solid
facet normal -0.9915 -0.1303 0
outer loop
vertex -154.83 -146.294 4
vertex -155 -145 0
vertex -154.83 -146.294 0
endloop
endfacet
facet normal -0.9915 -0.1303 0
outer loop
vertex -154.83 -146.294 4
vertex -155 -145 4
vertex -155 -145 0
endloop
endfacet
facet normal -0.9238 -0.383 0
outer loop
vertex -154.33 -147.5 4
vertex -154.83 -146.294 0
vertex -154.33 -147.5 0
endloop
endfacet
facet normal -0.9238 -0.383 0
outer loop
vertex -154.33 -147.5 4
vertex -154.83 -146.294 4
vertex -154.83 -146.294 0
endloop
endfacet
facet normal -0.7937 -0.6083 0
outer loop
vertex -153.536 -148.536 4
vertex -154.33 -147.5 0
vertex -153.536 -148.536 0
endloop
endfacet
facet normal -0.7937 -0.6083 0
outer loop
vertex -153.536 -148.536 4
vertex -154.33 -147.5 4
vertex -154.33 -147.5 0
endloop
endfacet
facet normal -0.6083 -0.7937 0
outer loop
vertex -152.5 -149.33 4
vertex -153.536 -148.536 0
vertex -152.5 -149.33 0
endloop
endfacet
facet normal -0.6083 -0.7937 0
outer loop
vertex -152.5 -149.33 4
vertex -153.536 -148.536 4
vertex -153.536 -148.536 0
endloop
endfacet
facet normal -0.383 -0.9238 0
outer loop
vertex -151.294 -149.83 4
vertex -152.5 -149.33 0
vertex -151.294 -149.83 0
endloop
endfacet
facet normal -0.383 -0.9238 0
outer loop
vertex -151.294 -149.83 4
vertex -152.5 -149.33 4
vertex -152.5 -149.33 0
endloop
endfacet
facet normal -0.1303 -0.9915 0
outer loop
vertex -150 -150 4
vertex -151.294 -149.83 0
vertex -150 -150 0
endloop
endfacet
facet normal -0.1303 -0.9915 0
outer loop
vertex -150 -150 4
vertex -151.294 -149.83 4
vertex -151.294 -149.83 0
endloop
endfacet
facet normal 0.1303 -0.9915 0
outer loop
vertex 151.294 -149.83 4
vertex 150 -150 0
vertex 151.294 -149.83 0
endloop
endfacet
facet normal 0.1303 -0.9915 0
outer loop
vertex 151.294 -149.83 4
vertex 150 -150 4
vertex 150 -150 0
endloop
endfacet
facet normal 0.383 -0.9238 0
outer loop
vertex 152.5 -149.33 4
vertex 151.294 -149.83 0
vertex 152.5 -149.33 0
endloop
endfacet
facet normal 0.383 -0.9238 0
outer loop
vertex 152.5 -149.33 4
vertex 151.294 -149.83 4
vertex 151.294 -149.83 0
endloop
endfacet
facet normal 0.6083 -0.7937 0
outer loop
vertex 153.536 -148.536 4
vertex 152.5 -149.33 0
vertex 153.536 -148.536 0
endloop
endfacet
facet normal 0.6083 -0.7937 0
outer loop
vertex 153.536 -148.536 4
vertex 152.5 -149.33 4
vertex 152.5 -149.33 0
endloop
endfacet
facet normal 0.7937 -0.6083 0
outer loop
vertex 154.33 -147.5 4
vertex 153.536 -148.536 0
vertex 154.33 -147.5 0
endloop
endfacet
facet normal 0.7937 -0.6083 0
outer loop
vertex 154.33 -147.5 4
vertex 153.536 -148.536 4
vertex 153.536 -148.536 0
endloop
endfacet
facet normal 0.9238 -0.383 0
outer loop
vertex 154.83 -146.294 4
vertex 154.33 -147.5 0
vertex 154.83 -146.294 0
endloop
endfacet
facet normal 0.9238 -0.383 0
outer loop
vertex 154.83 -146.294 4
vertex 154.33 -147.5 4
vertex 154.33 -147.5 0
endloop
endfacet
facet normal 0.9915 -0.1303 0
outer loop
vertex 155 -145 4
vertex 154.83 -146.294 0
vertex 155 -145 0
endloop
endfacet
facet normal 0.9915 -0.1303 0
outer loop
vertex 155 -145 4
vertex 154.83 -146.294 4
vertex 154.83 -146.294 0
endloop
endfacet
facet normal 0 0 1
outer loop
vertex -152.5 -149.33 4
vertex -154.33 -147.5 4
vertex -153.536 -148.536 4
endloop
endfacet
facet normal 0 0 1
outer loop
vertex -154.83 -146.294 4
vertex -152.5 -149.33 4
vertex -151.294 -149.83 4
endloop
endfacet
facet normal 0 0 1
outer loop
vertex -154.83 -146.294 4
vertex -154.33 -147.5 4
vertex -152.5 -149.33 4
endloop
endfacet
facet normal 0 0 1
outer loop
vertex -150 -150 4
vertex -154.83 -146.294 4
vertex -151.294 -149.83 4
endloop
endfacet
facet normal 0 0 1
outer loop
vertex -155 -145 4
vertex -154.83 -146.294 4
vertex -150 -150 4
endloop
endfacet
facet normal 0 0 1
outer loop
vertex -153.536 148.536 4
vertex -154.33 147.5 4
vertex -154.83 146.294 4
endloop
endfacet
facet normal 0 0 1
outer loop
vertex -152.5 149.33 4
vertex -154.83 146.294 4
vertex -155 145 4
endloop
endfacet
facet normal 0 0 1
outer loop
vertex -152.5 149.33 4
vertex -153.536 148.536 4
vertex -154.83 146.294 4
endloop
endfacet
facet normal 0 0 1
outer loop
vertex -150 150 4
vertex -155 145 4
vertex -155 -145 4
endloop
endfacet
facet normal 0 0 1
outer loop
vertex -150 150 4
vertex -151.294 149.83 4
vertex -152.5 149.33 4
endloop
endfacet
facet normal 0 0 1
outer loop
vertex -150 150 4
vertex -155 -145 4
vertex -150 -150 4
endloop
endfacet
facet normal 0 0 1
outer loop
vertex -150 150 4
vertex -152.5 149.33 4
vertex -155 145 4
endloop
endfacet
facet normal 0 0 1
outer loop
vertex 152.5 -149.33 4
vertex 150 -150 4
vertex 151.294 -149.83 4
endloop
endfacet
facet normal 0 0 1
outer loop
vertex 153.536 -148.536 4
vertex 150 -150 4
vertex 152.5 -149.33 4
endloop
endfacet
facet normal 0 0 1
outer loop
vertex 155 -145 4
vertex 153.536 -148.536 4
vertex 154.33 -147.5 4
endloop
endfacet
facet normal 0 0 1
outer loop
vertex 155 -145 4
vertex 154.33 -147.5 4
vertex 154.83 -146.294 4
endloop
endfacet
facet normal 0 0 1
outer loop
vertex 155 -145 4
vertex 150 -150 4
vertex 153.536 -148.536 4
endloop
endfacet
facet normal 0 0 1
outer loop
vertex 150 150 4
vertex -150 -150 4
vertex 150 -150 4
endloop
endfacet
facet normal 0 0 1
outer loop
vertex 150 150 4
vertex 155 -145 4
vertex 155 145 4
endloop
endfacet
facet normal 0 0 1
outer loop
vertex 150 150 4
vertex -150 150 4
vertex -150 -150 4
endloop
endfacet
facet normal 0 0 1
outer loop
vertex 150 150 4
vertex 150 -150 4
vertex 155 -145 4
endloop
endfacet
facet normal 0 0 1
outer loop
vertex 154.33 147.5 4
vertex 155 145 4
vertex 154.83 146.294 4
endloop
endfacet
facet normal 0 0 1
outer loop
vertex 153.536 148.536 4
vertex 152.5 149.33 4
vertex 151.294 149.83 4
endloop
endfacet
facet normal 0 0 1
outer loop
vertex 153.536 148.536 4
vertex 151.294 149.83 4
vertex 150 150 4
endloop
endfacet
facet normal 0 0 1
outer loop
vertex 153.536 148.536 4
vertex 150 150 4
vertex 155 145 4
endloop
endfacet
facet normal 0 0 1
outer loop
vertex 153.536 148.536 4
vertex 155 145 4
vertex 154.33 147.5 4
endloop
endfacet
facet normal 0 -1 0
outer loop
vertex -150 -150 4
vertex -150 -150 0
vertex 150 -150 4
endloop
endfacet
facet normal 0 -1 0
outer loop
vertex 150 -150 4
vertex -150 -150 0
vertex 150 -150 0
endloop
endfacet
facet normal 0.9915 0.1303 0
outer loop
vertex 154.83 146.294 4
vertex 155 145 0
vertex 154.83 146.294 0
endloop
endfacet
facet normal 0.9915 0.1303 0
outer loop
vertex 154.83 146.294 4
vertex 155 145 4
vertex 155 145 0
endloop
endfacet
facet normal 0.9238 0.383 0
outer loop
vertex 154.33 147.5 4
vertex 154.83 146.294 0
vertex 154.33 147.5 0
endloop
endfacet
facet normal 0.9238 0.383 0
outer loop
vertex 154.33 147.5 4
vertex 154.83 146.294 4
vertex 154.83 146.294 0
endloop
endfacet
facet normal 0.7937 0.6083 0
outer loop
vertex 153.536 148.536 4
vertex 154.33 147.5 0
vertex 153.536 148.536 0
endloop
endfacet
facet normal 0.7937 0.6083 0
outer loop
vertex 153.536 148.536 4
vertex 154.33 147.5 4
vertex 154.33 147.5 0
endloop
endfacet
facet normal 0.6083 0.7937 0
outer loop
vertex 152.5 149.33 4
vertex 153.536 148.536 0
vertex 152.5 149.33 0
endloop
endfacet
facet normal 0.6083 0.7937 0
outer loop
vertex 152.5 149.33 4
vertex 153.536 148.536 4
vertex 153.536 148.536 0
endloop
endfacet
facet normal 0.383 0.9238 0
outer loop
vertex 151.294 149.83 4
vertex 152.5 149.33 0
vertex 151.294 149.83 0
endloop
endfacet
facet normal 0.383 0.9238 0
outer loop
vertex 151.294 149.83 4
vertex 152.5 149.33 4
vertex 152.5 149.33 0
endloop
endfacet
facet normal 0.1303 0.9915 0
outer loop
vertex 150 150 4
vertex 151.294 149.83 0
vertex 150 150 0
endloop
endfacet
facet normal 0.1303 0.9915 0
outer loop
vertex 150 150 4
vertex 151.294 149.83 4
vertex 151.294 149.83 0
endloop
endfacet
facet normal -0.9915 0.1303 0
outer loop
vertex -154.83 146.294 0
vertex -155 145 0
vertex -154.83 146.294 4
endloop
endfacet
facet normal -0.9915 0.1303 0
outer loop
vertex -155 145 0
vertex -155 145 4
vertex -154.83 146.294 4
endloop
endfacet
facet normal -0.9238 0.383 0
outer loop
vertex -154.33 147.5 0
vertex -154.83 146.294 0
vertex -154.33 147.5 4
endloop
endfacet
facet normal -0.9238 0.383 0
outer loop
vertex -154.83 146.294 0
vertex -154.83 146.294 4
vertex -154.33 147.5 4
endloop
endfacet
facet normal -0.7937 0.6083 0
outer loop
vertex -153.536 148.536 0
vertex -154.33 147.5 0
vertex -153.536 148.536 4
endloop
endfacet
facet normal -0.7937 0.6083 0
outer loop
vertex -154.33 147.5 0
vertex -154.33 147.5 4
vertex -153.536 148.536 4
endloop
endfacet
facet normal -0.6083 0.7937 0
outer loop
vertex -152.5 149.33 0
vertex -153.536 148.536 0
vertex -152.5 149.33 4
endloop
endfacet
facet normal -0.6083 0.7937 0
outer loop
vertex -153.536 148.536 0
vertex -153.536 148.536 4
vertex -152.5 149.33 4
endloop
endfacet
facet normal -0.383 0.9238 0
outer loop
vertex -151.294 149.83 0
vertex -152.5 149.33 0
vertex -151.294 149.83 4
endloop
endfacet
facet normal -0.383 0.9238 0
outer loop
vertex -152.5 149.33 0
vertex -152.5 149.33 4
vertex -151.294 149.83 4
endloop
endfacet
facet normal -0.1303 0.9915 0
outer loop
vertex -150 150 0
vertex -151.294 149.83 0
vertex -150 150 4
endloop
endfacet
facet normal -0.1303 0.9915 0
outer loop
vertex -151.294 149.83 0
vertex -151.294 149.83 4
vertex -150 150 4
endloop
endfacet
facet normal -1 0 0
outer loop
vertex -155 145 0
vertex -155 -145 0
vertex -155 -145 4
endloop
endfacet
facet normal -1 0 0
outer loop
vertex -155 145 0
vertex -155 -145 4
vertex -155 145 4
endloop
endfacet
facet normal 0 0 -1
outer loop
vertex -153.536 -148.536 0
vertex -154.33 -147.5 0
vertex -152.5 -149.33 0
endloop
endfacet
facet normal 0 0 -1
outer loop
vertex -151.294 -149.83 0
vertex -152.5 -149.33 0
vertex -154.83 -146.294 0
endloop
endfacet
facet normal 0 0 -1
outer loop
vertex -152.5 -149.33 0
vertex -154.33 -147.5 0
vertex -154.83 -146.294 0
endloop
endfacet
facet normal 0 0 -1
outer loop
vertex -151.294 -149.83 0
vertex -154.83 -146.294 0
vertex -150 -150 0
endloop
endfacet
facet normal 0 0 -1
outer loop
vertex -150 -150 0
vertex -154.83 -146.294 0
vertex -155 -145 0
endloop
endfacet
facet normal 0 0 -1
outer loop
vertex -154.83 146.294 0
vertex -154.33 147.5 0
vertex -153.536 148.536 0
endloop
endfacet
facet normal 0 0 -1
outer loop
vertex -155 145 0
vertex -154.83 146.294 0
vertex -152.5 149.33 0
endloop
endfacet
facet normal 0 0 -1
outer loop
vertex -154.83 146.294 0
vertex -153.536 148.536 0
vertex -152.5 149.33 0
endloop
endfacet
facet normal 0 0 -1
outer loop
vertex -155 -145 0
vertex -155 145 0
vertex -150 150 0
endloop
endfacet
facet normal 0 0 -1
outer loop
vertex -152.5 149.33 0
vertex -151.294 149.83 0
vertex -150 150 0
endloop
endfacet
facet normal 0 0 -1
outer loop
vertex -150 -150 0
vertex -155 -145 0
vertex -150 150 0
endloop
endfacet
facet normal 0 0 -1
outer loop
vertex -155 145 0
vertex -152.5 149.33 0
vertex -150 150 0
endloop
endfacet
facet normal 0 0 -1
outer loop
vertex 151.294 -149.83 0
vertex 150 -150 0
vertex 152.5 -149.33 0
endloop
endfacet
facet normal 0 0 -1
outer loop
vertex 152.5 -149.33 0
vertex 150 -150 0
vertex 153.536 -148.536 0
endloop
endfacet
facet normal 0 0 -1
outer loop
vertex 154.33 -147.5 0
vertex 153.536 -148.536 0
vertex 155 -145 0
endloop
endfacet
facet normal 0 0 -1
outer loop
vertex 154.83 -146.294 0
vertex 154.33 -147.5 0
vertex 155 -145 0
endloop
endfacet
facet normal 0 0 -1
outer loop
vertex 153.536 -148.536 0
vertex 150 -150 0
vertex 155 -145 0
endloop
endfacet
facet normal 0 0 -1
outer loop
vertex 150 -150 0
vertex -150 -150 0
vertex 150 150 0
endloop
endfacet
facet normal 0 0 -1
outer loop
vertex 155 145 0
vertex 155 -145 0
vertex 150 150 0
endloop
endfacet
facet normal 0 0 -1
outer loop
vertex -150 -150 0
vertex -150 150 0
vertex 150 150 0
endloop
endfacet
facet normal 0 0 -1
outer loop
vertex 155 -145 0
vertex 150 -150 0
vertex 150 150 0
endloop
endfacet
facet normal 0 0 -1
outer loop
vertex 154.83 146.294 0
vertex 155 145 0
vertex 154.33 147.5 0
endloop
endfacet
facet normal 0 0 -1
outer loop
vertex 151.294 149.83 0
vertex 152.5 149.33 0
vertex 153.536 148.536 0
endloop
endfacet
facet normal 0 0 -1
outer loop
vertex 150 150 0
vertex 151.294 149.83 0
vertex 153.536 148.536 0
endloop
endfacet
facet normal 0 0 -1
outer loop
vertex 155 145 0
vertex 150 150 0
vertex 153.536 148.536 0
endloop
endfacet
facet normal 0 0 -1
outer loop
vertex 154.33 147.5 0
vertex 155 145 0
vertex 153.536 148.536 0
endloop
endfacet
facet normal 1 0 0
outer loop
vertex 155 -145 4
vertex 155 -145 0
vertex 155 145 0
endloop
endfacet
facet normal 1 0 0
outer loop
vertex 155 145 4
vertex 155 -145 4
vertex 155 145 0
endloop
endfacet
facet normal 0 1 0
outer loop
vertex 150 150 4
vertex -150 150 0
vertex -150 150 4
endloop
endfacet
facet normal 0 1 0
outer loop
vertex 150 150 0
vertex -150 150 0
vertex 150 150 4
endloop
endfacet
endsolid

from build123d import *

# Parameters (mm, degrees)
SKETCH_1_W      = 310
SKETCH_1_H      = 300
EXTRUDE_1_DEPTH = 4
FILLET_1_R      = 5


with BuildPart() as part:
    # ｽｹｯﾁ1 → ﾎﾞｽ - 押し出し1 (new body)
    with BuildSketch(Plane.XY):
        Rectangle(SKETCH_1_W, SKETCH_1_H)
    extrude(amount=EXTRUDE_1_DEPTH)

    # ﾌｨﾚｯﾄ1
    fillet_1_edges = [part.edges().sort_by_distance(p)[0] for p in [
        (155, -150, 2),
        (-155, -150, 2),
        (-155, 150, 2),
        (155, 150, 2),
    ]]
    fillet(fillet_1_edges, radius=FILLET_1_R)


solid = part.part
